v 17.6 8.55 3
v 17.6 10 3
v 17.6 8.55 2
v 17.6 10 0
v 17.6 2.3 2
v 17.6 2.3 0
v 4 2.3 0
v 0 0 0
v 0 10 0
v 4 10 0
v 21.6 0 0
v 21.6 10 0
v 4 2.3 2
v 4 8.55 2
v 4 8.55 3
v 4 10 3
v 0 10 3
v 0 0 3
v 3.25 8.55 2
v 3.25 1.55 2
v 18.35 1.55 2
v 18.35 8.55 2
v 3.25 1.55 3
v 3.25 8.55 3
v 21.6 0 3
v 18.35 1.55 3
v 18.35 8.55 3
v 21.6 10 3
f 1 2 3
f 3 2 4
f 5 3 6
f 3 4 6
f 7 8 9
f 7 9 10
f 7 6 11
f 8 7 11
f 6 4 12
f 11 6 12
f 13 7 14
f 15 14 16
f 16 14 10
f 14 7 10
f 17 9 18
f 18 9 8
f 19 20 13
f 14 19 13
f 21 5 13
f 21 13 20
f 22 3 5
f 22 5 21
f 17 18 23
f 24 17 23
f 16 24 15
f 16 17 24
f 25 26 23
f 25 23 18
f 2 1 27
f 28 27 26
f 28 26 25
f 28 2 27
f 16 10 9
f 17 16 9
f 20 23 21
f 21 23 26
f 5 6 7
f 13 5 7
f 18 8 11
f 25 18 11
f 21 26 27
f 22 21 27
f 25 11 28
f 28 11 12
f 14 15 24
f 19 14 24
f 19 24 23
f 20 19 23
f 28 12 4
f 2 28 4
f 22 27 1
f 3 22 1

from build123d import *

# Parameters (mm, degrees)
F1_DEPTH = 3
F3_DEPTH = 1


with BuildPart() as f1:
    # F0 (on Top) → F1 (new body)
    with BuildSketch(Plane.XY):
        Polygon((0, 10), (0, 0), (21.6, 0), (21.6, 10), (17.6, 10), (17.6, 2.3), (4, 2.3), (4, 10), align=None)
    extrude(amount=F1_DEPTH)

    # F2 (on face) → F3 (cut)
    with BuildSketch(Plane.XY.offset(3)):
        Polygon((4, 2.3), (4, 8.55), (3.25, 8.55), (3.25, 1.55), (18.35, 1.55), (18.35, 8.55), (17.6, 8.55), (17.6, 2.3), align=None)
    extrude(amount=-F3_DEPTH, mode=Mode.SUBTRACT)


solid = f1.part
